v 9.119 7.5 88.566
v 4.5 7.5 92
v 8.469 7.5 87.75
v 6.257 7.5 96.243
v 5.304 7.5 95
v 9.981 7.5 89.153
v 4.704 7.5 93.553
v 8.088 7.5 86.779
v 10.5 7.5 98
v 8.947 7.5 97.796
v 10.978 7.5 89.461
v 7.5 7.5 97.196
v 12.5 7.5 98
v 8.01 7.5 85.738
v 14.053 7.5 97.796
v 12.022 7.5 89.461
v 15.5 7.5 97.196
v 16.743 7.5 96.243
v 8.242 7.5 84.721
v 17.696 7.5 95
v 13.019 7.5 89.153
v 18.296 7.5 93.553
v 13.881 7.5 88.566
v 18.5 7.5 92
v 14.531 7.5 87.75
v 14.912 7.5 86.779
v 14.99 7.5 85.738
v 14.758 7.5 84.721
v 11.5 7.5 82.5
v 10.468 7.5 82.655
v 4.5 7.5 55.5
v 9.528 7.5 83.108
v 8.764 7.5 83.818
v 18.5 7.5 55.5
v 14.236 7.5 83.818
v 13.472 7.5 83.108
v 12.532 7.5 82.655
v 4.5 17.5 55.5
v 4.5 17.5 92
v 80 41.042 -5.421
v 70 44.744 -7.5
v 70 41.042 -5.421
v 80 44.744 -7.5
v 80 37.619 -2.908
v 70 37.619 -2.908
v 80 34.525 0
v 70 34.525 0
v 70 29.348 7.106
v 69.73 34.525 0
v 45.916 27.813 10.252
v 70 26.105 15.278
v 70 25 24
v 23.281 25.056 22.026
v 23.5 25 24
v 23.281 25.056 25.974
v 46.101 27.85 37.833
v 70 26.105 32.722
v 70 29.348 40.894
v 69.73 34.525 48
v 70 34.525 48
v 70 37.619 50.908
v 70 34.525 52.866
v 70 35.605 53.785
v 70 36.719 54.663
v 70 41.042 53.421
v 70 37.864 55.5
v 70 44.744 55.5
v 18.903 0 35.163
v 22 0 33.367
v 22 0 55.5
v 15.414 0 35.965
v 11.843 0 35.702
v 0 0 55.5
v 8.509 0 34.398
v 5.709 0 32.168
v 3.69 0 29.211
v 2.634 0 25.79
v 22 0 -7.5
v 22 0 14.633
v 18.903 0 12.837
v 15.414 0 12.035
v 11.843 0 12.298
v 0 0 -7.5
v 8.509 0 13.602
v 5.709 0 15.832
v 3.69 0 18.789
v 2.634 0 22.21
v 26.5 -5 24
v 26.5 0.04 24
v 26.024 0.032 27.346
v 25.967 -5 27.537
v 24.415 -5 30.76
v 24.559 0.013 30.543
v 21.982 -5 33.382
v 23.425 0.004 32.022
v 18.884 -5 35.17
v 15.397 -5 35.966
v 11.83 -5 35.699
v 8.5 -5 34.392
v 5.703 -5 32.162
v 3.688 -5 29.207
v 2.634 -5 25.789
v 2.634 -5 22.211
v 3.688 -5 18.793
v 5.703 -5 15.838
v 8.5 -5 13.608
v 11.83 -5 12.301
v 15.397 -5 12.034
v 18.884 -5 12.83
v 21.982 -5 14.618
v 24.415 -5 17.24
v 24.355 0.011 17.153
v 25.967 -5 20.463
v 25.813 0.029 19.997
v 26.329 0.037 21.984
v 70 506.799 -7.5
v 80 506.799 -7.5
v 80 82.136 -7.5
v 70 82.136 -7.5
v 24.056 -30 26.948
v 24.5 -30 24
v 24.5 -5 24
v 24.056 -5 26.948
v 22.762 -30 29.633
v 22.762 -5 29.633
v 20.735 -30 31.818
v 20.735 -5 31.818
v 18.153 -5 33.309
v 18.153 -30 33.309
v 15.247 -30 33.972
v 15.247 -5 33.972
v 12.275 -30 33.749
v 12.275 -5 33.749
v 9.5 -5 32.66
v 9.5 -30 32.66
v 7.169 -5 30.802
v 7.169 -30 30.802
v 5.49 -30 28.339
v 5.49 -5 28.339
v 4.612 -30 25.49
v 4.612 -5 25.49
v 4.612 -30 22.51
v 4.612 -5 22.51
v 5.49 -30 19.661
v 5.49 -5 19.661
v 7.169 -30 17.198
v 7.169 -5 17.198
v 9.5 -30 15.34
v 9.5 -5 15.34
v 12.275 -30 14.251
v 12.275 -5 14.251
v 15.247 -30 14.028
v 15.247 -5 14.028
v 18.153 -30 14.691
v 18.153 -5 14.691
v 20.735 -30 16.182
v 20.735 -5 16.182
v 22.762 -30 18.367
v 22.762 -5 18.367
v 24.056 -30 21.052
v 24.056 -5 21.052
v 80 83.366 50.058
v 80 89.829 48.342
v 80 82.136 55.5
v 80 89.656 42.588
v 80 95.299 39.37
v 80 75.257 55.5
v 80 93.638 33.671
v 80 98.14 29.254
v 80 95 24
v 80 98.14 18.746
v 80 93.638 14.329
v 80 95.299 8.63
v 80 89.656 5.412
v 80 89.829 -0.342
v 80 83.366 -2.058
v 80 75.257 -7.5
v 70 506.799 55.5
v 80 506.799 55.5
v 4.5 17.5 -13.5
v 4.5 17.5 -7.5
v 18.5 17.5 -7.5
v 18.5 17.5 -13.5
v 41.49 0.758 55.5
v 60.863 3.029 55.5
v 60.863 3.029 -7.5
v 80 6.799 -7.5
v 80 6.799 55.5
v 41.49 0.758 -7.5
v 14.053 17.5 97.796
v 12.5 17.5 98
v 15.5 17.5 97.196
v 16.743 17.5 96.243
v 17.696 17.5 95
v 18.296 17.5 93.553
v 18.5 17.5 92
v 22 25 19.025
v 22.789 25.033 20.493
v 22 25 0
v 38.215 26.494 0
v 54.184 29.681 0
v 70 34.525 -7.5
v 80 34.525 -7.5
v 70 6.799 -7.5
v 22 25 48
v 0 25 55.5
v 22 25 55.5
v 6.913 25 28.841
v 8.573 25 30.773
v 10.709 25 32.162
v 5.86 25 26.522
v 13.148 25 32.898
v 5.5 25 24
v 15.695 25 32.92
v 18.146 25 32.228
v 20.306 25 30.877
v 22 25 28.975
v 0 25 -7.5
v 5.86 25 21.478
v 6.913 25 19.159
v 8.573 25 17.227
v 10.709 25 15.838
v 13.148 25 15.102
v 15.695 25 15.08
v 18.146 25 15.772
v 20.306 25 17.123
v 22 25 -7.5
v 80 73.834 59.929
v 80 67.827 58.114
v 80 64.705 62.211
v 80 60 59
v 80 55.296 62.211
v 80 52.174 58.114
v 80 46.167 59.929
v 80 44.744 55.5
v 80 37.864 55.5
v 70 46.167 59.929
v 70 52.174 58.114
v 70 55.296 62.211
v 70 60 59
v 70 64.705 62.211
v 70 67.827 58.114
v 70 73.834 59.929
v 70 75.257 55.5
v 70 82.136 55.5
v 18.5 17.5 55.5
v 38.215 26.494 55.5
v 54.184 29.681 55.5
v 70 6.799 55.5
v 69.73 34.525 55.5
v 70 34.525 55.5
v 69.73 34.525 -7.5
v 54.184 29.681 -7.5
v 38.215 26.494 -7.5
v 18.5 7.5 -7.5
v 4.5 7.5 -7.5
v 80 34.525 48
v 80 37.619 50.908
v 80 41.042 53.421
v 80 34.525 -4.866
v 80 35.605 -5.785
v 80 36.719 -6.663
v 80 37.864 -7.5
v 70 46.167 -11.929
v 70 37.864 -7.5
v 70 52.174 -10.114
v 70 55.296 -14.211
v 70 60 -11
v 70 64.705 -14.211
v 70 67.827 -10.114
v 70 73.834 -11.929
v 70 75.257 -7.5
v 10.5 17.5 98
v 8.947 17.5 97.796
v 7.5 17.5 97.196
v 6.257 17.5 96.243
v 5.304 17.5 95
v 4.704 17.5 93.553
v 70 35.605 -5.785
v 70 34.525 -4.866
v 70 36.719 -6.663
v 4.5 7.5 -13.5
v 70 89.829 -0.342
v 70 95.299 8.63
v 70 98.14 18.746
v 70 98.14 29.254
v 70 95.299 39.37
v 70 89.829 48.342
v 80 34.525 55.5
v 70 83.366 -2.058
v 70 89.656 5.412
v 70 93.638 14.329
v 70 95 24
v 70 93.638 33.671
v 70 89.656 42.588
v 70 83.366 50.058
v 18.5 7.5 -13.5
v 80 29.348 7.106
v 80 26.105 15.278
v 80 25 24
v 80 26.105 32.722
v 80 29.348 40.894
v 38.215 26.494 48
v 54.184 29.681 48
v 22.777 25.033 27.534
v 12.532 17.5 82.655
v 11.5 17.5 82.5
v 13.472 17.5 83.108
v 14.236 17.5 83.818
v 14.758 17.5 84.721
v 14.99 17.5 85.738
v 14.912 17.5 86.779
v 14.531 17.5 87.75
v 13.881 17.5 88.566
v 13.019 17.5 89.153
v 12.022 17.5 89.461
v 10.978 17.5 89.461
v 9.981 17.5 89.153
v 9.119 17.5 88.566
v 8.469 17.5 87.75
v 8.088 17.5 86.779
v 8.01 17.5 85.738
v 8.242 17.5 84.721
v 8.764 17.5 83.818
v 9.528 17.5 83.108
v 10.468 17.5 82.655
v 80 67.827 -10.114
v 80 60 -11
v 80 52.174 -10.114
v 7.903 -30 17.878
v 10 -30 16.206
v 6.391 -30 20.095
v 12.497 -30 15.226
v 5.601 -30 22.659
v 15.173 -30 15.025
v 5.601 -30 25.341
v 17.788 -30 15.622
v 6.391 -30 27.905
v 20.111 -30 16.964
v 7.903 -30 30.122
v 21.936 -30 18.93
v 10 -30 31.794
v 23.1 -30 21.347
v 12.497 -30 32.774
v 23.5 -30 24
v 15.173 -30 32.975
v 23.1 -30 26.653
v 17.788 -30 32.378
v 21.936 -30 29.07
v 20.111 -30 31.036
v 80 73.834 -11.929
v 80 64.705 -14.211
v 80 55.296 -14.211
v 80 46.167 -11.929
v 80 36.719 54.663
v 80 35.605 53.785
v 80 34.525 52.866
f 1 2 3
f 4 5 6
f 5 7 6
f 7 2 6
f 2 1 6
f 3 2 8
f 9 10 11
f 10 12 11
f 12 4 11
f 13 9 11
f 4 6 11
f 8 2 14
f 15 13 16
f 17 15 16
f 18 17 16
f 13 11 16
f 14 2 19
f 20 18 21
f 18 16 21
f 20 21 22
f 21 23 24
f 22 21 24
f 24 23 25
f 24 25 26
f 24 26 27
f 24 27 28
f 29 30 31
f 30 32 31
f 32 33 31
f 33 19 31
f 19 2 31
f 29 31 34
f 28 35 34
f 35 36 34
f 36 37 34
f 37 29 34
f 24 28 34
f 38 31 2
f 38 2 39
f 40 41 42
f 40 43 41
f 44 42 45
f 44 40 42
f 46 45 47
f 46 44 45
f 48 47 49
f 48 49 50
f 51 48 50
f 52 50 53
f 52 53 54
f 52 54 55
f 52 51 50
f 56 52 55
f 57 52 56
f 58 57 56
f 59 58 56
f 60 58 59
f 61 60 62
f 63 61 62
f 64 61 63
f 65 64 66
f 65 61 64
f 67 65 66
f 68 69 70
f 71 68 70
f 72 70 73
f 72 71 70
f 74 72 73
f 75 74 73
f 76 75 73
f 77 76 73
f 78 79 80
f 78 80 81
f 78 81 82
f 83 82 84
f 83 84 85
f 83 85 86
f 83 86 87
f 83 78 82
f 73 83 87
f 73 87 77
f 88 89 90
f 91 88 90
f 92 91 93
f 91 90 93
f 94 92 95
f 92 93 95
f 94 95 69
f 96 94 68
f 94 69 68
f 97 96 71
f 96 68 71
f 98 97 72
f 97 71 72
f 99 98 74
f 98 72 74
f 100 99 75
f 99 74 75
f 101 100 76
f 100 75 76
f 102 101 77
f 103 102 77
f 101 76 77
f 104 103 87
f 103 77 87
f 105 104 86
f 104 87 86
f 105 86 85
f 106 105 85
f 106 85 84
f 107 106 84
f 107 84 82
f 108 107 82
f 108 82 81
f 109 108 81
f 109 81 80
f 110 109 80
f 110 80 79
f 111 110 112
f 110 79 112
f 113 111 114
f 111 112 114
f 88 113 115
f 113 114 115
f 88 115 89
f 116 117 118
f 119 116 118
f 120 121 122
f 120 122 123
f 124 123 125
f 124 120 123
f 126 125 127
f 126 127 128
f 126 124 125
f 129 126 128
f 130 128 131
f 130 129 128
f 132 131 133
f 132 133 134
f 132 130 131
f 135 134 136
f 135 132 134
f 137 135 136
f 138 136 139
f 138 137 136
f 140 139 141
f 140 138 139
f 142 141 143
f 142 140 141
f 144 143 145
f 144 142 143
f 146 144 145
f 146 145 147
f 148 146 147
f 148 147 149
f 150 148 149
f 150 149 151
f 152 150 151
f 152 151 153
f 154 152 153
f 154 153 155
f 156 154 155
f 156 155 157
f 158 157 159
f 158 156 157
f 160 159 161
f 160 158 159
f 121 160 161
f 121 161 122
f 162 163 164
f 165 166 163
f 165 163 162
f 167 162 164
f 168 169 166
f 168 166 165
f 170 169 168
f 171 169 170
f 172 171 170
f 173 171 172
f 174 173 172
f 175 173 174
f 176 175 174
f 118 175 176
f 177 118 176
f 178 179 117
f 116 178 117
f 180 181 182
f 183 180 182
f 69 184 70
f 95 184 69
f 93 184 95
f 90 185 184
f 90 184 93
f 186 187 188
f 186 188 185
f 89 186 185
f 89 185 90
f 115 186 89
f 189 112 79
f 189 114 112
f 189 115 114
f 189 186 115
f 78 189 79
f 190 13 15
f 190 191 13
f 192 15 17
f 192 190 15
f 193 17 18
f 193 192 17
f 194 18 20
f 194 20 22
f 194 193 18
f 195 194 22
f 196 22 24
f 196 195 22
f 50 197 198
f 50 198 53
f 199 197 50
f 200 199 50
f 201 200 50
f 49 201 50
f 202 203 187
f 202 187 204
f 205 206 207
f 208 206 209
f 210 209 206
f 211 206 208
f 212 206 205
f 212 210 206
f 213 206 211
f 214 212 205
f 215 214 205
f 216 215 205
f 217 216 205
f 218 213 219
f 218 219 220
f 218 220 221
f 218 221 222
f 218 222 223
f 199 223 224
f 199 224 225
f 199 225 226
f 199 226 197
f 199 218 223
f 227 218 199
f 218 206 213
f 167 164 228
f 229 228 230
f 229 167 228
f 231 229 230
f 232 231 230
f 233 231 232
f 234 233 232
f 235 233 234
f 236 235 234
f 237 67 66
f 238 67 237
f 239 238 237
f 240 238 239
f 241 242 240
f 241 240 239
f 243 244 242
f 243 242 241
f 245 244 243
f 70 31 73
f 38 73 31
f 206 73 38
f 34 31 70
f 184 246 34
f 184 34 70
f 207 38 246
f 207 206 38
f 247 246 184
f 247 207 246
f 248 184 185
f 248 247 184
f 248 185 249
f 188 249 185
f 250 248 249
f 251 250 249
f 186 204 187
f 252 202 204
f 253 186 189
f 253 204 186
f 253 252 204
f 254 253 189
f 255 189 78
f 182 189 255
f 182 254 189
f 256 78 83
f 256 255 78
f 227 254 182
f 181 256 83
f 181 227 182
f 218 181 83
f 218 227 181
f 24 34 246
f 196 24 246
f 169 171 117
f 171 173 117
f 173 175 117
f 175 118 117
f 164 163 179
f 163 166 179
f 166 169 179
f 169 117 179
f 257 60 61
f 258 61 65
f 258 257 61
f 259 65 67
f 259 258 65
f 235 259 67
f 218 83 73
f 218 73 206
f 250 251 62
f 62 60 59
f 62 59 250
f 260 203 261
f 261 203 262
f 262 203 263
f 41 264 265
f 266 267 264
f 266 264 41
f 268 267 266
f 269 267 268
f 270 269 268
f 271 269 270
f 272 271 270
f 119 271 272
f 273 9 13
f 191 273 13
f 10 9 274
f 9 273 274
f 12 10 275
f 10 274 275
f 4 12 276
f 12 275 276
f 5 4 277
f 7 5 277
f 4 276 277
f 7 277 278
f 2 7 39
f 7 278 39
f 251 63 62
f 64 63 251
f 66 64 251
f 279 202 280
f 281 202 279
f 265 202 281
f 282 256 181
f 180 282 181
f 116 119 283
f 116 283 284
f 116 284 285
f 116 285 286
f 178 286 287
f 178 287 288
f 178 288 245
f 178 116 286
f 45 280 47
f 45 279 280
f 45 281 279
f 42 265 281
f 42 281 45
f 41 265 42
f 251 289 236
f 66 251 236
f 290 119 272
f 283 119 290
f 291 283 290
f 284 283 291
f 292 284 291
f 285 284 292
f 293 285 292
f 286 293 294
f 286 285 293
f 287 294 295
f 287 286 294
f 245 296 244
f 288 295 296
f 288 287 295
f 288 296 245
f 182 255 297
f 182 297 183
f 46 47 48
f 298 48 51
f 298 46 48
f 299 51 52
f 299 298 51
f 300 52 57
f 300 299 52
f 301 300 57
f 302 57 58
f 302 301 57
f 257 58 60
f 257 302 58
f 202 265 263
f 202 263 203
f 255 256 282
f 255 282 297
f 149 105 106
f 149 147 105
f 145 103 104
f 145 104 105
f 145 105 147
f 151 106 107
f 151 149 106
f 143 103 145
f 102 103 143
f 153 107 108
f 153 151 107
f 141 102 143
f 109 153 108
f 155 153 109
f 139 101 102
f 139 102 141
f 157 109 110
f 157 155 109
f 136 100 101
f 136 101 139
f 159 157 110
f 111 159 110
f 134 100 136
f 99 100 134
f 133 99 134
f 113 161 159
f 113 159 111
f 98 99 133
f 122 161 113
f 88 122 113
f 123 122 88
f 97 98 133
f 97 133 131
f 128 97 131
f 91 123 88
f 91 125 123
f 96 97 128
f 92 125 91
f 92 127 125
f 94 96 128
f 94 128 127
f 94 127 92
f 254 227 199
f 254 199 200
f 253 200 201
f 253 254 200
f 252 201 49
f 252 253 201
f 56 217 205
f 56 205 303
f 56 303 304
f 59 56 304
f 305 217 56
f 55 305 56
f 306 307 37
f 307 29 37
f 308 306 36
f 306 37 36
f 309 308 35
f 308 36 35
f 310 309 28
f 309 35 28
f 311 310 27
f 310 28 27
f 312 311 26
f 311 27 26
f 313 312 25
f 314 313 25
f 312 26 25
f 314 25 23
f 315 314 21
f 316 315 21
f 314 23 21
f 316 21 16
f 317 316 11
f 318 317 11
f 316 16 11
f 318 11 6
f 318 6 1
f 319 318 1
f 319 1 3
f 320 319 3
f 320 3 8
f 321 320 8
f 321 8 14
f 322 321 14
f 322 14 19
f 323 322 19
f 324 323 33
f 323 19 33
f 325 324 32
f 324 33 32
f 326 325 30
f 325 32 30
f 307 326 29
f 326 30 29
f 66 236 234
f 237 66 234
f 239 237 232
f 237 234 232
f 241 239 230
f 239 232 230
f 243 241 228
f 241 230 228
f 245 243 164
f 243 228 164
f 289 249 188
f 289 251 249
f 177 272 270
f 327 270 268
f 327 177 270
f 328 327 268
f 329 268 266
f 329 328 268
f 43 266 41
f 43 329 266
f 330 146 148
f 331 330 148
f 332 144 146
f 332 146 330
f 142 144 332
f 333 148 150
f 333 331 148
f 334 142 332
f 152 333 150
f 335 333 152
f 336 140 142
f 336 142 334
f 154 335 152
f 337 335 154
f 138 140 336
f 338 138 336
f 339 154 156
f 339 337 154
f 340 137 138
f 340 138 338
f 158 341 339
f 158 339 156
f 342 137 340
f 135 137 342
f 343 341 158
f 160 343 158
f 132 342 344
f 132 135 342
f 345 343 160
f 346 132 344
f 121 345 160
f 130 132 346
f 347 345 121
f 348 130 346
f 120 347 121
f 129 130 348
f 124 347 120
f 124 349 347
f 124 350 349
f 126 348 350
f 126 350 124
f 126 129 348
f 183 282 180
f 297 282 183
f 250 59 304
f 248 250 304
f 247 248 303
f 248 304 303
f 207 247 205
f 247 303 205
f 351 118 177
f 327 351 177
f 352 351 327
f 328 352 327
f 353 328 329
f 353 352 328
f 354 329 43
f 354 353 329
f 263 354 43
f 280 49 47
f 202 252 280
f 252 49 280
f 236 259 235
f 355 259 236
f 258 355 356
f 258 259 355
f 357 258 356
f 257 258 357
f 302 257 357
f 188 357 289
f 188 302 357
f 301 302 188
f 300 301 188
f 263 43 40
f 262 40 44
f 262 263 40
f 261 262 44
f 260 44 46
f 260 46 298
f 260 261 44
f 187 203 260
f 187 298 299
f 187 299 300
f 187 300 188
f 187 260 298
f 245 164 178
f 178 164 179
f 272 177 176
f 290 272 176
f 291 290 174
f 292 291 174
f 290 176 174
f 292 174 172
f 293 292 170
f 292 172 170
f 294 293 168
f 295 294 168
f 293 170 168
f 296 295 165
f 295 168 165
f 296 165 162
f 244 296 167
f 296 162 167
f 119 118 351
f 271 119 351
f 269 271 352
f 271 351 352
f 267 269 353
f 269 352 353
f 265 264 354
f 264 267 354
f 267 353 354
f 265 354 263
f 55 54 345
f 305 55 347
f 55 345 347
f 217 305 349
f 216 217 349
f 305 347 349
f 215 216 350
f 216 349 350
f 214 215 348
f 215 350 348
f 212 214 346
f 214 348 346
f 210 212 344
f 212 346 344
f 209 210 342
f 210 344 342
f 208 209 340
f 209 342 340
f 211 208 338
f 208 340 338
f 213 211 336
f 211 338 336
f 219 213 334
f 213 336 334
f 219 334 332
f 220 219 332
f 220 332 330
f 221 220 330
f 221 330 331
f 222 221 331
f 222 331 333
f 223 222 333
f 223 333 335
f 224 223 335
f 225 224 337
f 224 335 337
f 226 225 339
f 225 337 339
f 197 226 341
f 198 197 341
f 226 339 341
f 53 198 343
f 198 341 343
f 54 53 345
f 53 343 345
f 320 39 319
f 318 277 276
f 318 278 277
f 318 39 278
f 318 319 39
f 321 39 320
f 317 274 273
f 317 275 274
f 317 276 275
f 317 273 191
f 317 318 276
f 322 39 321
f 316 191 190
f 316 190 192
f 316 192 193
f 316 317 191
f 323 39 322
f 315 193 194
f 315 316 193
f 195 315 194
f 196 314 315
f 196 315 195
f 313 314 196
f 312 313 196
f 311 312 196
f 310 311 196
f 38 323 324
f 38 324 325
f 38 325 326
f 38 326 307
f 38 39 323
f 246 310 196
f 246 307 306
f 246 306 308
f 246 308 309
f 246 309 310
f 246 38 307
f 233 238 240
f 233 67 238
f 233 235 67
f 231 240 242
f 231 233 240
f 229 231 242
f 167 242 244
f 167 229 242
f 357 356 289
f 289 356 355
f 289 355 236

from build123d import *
from build123d.topology import SkipClean

# Parameters (mm, degrees)
BOSS_EXTRUDE1_DEPTH       = 48
SKETCH2_W                 = 14
SKETCH2_H                 = 10
BOSS_EXTRUDE2_DEPTH       = 50
CUT_EXTRUDE1_DEPTH        = 98
M8X1_0_TAPPED_HOLE1_D     = 7
M8X1_0_TAPPED_HOLE1_DEPTH = 10
M8X1_0_TAPPED_HOLE1_TIP   = 2.103012167
FILLET1_R                 = 6
SKETCH7_R                 = 38.5
SKETCH7_R_2               = 35
BOSS_EXTRUDE3_DEPTH       = 10
SKETCH8_R                 = 35
CUT_EXTRUDE2_DEPTH        = 90
BOSS_EXTRUDE4_DEPTH       = 5
BOSS_EXTRUDE4_DEPTH_BACK  = 10
SKETCH10_R                = 12
SKETCH10_R_2              = 9
BOSS_EXTRUDE5_START       = 25
SKETCH11_R                = 10
SKETCH11_R_2              = 9
BOSS_EXTRUDE5_DEPTH       = 25
SKETCH12_R                = 9
CUT_EXTRUDE3_DEPTH        = 42
BOSS_EXTRUDE6_DEPTH       = 7.5
BOSS_EXTRUDE7_START       = 7.5
BOSS_EXTRUDE7_DEPTH       = 7.5
BOSS_EXTRUDE8_DEPTH       = 10


with BuildPart() as part:
    # Sketch1 → Boss-Extrude1 (new body)
    with BuildSketch(Plane.XY):
        with BuildLine():
            Line((0, 0), (0, 25.00039893))
            Line((0, 25.00039893), (22, 25.00039893))
            ThreePointArc((22, 25.00039893), (51.667114877, 29.062120939), (80, 38.751440389))
            Line((80, 38.751440389), (80, 6.798665084))
            ThreePointArc((80, 6.798665084), (51.198552391, 1.705464917), (22, 0))
            Line((22, 0), (0, 0))
        make_face()
    extrude(amount=BOSS_EXTRUDE1_DEPTH)

    # Sketch2 → Boss-Extrude2 (add)
    with BuildSketch(Plane.XY.offset(48)):
        with Locations((11.5, 12.5)):
            Rectangle(SKETCH2_W, SKETCH2_H)
    boss_extrude2 = extrude(amount=BOSS_EXTRUDE2_DEPTH)

    # Mirror1: Boss-Extrude2 across plane
    add(boss_extrude2.mirror(Plane.XY.offset(24)))

    # Sketch3 → Cut-Extrude1 (cut)
    with BuildSketch(Plane(origin=(0, 0, 0), x_dir=(1, 0, 0), z_dir=(0, 1, 0))):
        Polygon((32.759036304, 13.5), (11.5, 13.5), (-23.123003772, 13.5), (-23.123003772, 84.867154232), (32.759036304, 84.867154232), align=None)
    extrude(amount=CUT_EXTRUDE1_DEPTH, mode=Mode.SUBTRACT)

    # M8x1.0 Tapped Hole1
    with Locations(Plane(origin=(11.5, 17.5, 86), x_dir=(0, 0, 1), z_dir=(0, 1, 0))):
        with Locations((0, 0)):
            Hole(M8X1_0_TAPPED_HOLE1_D / 2, depth=M8X1_0_TAPPED_HOLE1_DEPTH)
            with Locations((0, 0, -(M8X1_0_TAPPED_HOLE1_DEPTH + M8X1_0_TAPPED_HOLE1_TIP / 2))):  # 118° drill point
                Cone(0, M8X1_0_TAPPED_HOLE1_D / 2, M8X1_0_TAPPED_HOLE1_TIP, mode=Mode.SUBTRACT)

    # Fillet1
    fillet1_edges = [part.edges().sort_by_distance(p)[0] for p in [
        (18.5, 12.5, 98),
        (4.5, 12.5, 98),
    ]]
    fillet(fillet1_edges, radius=FILLET1_R)

    # Sketch7 → Boss-Extrude3 (add)
    with BuildSketch(Plane.ZY.offset(-80)):
        with Locations((24, 60.00039893)):
            Circle(SKETCH7_R)
        with Locations((24, 60.00039893)):
            Circle(SKETCH7_R_2, mode=Mode.SUBTRACT)
    extrude(amount=BOSS_EXTRUDE3_DEPTH)

    # Sketch8 → Cut-Extrude2 (cut)
    with BuildSketch(Plane.ZY.offset(-80)):
        with Locations(Location((24, 60.00039893, 0), (0, 0, 226.708192407))):
            Circle(SKETCH8_R)
    extrude(amount=CUT_EXTRUDE2_DEPTH, mode=Mode.SUBTRACT)

    # Sketch10 → Boss-Extrude4 (add, two sides: drawn at the far end of the back side and taken through both)
    with BuildSketch(Plane.XZ.offset(-BOSS_EXTRUDE4_DEPTH_BACK)):
        with Locations((14.5, 24)):
            Circle(SKETCH10_R)
        with Locations((14.5, 24)):
            Circle(SKETCH10_R_2, mode=Mode.SUBTRACT)
    extrude(amount=BOSS_EXTRUDE4_DEPTH + BOSS_EXTRUDE4_DEPTH_BACK)

    # Sketch11 → Boss-Extrude5 (add)
    with BuildSketch(Plane.XZ.offset(5).offset(BOSS_EXTRUDE5_START)):
        with Locations((14.5, 24)):
            Circle(SKETCH11_R)
        with Locations((14.5, 24)):
            Circle(SKETCH11_R_2, mode=Mode.SUBTRACT)
    extrude(amount=-BOSS_EXTRUDE5_DEPTH)

    # Sketch12 → Cut-Extrude3 (cut)
    with BuildSketch(Plane(origin=(0, 0, 0), x_dir=(-1, 0, 0), z_dir=(0, -1, 0))):
        with Locations(Location((-14.5, -24, 0), (0, 0, 180))):
            Circle(SKETCH12_R)
    extrude(amount=-CUT_EXTRUDE3_DEPTH, mode=Mode.SUBTRACT)

    # Sketch13 → Boss-Extrude6 (add)
    with BuildSketch(Plane.XY.offset(48)):
        with BuildLine():
            Line((0, 25.00039893), (0, 0))
            Line((0, 0), (22, 0))
            ThreePointArc((22, 0), (51.198552391, 1.705464917), (80, 6.798665084))
            Line((80, 6.798665084), (80, 29.896412483))
            Line((80, 29.896412483), (80, 34.524920524))
            Line((80, 34.524920524), (70, 34.524920524))
            Line((70, 34.524920524), (69.729925021, 34.524920524))
            ThreePointArc((69.729925021, 34.524920524), (46.24106465, 27.877911315), (22, 25.00039893))
            Line((22, 25.00039893), (0, 25.00039893))
        make_face()
    extrude(amount=BOSS_EXTRUDE6_DEPTH)

    # Sketch14 → Boss-Extrude7 (add)
    with BuildSketch(Plane(origin=(0, 0, 0), x_dir=(-1, 0, 0), z_dir=(0, 0, -1)).offset(BOSS_EXTRUDE7_START)):
        with BuildLine():
            Line((-80, 29.896412483), (-80, 6.798665084))
            ThreePointArc((-80, 6.798665084), (-51.198552391, 1.705464917), (-22, 0))
            Line((-22, 0), (0, 0))
            Line((0, 0), (0, 25.00039893))
            Line((0, 25.00039893), (-22, 25.00039893))
            ThreePointArc((-22, 25.00039893), (-46.24106465, 27.877911315), (-69.729925021, 34.524920524))
            Line((-69.729925021, 34.524920524), (-70, 34.524920524))
            Line((-70, 34.524920524), (-80, 34.524920524))
            Line((-80, 34.524920524), (-80, 29.896412483))
        make_face()
    extrude(amount=-BOSS_EXTRUDE7_DEPTH)

    # Sketch15 → Boss-Extrude8 (add)
    with SkipClean():  # the faces are left unmerged after this step: merging them gives an invalid solid
        with BuildSketch(Plane(origin=(80, 0, 0), x_dir=(0, 0, -1), z_dir=(1, 0, 0))):
            with BuildLine():
                Line((-55.5, 6.798665084), (-55.5, 44.744252628))
                ThreePointArc((-55.5, 44.744252628), (-24, 25.00039893), (7.5, 44.744252628))
                Line((7.5, 44.744252628), (7.5, 6.798665084))
                Line((7.5, 6.798665084), (-55.5, 6.798665084))
            make_face()
            with BuildLine():
                Line((-55.5, 506.798665084), (7.5, 506.798665084))
                Line((7.5, 506.798665084), (7.5, 75.256545232))
                ThreePointArc((7.5, 75.256545232), (-24, 95.00039893), (-55.5, 75.256545232))
                Line((-55.5, 75.256545232), (-55.5, 506.798665084))
            make_face()
        extrude(amount=-BOSS_EXTRUDE8_DEPTH)


solid = part.part
